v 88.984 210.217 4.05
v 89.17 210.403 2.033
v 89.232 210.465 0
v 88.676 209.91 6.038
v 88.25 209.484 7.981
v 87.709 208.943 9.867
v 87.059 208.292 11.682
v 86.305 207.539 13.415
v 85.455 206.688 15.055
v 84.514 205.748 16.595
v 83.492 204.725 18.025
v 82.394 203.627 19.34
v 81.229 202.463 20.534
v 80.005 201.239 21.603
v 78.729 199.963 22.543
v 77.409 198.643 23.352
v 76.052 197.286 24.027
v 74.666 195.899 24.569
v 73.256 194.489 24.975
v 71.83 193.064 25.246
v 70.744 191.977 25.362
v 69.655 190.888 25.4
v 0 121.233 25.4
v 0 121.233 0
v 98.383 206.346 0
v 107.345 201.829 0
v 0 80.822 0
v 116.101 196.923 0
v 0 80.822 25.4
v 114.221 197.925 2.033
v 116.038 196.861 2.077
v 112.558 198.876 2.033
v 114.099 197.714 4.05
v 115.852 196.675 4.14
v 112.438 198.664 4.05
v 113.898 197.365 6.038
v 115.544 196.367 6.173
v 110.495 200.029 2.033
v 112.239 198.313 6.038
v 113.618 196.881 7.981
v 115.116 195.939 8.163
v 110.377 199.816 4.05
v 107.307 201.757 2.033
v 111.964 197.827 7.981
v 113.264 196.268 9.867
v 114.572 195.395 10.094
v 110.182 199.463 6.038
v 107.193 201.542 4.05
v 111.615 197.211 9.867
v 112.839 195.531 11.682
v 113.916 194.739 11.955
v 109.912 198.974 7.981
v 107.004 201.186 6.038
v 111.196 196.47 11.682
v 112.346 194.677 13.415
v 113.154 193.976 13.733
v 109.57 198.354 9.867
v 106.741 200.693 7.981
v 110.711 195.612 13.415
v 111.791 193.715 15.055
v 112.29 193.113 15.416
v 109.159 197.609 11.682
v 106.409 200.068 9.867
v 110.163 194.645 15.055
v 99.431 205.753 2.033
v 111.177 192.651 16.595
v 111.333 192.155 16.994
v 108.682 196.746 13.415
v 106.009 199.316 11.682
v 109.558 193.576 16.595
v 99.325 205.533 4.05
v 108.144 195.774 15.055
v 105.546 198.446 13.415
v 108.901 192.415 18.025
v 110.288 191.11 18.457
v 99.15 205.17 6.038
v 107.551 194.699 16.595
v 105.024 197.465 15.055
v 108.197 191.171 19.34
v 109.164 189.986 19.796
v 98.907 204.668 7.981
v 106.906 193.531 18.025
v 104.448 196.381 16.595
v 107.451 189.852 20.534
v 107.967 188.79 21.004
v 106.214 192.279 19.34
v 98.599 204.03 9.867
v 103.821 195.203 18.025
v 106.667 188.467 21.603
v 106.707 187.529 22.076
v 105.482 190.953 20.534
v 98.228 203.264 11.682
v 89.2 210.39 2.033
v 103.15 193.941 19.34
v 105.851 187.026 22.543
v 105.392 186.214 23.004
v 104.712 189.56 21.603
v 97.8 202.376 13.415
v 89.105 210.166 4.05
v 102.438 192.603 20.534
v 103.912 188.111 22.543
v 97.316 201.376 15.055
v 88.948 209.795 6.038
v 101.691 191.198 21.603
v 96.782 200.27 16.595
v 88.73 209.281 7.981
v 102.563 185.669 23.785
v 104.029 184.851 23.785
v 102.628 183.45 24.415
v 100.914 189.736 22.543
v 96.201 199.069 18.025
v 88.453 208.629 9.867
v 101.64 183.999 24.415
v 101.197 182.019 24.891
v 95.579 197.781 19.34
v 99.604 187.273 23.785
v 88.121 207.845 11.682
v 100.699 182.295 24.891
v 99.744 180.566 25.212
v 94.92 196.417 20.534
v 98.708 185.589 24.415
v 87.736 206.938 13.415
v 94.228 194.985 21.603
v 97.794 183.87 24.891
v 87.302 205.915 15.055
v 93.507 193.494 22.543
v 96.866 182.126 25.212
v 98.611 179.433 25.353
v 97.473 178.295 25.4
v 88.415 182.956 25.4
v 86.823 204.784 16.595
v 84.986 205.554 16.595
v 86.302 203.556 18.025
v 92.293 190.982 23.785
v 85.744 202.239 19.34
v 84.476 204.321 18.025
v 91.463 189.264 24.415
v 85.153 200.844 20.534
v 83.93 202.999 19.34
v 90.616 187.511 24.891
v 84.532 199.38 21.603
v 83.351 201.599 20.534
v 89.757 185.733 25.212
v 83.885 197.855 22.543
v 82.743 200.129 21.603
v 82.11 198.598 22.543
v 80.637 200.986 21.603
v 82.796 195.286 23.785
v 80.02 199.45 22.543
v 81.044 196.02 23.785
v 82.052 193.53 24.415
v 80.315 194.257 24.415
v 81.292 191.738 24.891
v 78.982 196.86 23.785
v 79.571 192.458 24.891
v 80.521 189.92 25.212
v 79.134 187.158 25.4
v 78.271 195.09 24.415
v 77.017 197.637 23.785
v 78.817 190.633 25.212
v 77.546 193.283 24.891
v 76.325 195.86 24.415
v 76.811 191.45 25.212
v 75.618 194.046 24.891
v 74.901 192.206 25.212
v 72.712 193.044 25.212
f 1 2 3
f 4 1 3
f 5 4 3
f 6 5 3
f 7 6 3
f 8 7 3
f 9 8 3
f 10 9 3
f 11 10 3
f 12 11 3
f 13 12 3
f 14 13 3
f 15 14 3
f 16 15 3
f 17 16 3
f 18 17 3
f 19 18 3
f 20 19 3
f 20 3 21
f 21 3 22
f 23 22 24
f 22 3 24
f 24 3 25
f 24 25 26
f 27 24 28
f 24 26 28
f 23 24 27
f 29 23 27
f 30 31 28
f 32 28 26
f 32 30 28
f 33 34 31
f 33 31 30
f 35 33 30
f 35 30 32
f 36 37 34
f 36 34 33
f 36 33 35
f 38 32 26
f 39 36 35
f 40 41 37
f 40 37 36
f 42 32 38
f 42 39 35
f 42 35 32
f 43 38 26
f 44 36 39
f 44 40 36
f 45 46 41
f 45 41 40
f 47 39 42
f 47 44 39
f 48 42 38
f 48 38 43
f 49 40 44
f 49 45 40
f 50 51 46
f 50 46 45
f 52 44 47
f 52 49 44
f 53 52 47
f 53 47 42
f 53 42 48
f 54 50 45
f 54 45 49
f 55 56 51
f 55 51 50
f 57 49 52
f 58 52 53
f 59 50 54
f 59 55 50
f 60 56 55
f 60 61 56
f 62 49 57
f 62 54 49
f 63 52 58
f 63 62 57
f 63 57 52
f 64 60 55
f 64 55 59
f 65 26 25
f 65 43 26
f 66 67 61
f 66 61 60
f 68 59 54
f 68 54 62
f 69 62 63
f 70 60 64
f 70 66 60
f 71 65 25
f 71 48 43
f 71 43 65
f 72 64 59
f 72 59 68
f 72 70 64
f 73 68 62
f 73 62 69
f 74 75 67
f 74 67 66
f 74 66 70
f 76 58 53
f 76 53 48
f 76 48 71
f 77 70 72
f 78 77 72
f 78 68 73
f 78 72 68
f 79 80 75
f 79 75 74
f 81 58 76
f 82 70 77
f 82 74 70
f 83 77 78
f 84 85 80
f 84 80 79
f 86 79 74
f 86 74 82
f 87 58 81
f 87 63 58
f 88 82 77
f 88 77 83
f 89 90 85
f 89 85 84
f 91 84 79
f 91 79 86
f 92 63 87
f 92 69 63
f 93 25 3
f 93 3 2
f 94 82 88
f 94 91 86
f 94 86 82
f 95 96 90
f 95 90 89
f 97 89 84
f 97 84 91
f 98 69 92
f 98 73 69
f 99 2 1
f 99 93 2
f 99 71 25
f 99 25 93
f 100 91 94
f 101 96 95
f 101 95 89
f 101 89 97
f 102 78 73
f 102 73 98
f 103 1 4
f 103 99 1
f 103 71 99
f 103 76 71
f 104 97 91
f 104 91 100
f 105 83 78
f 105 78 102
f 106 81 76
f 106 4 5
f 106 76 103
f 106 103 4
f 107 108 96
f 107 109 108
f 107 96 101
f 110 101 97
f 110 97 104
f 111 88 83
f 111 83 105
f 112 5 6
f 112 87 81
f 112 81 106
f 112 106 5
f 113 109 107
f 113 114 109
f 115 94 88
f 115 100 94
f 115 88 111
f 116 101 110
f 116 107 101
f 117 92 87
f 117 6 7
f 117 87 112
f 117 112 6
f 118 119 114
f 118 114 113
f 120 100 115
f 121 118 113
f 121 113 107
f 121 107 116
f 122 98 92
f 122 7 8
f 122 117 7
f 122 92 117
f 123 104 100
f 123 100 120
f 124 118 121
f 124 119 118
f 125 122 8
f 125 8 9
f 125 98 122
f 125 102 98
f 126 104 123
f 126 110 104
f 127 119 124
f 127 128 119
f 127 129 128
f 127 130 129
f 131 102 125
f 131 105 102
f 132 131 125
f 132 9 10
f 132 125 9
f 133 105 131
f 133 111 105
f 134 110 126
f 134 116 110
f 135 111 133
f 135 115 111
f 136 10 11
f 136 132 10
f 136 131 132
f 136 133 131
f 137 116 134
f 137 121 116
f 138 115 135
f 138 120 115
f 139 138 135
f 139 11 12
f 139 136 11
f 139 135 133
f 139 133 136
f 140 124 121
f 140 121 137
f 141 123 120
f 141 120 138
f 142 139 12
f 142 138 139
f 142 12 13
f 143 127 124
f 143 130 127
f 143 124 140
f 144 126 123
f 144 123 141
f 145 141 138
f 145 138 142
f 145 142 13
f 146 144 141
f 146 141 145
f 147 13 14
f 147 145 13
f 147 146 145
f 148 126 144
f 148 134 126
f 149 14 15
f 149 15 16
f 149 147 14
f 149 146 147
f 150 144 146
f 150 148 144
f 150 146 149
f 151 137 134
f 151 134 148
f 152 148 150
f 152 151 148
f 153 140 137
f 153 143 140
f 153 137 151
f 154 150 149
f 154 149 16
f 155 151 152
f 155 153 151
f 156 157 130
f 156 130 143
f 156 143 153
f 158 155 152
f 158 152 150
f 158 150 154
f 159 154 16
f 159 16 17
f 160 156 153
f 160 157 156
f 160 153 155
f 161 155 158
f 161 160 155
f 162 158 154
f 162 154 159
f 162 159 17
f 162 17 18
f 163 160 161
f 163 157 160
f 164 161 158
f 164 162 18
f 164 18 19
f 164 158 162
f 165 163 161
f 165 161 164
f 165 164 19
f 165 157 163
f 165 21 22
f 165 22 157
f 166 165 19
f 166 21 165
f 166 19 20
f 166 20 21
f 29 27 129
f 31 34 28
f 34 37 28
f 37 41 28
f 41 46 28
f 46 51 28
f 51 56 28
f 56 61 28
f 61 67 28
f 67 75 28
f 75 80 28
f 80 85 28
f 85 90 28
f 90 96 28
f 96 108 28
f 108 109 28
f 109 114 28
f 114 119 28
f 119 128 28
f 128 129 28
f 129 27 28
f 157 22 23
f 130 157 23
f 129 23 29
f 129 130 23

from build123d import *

# Parameters (mm, degrees)
F2_DEPTH = 25.4
F3_R     = 25.39999


# Not quite as in the source:
# - a fillet or chamfer is up to 0.001 mm smaller than in the source, because OpenCascade refuses the exact size


with BuildPart() as f2:
    # F1 (on face) → F2 (new body)
    with BuildSketch(Plane.XY):
        with BuildLine():
            Line((0, 121.2334576344), (0, 80.8223050896))
            Line((0, 80.8223050896), (116.1005682623, 196.9228733519))
            ThreePointArc((116.1005682623, 196.9228733519), (102.889252487, 204.1366251379), (89.2318353651, 210.4652929995))
            Line((89.2318353651, 210.4652929995), (0, 121.2334576344))
        make_face()
    extrude(amount=F2_DEPTH)

    # F3 (radius 25.4 in the source; OpenCascade refuses exactly that, so slightly less here)
    f3_edges = [f2.edges().sort_by_distance(p)[0] for p in [
        (102.889252, 204.136625, 25.4),
    ]]
    fillet(f3_edges, radius=F3_R)


solid = f2.part
